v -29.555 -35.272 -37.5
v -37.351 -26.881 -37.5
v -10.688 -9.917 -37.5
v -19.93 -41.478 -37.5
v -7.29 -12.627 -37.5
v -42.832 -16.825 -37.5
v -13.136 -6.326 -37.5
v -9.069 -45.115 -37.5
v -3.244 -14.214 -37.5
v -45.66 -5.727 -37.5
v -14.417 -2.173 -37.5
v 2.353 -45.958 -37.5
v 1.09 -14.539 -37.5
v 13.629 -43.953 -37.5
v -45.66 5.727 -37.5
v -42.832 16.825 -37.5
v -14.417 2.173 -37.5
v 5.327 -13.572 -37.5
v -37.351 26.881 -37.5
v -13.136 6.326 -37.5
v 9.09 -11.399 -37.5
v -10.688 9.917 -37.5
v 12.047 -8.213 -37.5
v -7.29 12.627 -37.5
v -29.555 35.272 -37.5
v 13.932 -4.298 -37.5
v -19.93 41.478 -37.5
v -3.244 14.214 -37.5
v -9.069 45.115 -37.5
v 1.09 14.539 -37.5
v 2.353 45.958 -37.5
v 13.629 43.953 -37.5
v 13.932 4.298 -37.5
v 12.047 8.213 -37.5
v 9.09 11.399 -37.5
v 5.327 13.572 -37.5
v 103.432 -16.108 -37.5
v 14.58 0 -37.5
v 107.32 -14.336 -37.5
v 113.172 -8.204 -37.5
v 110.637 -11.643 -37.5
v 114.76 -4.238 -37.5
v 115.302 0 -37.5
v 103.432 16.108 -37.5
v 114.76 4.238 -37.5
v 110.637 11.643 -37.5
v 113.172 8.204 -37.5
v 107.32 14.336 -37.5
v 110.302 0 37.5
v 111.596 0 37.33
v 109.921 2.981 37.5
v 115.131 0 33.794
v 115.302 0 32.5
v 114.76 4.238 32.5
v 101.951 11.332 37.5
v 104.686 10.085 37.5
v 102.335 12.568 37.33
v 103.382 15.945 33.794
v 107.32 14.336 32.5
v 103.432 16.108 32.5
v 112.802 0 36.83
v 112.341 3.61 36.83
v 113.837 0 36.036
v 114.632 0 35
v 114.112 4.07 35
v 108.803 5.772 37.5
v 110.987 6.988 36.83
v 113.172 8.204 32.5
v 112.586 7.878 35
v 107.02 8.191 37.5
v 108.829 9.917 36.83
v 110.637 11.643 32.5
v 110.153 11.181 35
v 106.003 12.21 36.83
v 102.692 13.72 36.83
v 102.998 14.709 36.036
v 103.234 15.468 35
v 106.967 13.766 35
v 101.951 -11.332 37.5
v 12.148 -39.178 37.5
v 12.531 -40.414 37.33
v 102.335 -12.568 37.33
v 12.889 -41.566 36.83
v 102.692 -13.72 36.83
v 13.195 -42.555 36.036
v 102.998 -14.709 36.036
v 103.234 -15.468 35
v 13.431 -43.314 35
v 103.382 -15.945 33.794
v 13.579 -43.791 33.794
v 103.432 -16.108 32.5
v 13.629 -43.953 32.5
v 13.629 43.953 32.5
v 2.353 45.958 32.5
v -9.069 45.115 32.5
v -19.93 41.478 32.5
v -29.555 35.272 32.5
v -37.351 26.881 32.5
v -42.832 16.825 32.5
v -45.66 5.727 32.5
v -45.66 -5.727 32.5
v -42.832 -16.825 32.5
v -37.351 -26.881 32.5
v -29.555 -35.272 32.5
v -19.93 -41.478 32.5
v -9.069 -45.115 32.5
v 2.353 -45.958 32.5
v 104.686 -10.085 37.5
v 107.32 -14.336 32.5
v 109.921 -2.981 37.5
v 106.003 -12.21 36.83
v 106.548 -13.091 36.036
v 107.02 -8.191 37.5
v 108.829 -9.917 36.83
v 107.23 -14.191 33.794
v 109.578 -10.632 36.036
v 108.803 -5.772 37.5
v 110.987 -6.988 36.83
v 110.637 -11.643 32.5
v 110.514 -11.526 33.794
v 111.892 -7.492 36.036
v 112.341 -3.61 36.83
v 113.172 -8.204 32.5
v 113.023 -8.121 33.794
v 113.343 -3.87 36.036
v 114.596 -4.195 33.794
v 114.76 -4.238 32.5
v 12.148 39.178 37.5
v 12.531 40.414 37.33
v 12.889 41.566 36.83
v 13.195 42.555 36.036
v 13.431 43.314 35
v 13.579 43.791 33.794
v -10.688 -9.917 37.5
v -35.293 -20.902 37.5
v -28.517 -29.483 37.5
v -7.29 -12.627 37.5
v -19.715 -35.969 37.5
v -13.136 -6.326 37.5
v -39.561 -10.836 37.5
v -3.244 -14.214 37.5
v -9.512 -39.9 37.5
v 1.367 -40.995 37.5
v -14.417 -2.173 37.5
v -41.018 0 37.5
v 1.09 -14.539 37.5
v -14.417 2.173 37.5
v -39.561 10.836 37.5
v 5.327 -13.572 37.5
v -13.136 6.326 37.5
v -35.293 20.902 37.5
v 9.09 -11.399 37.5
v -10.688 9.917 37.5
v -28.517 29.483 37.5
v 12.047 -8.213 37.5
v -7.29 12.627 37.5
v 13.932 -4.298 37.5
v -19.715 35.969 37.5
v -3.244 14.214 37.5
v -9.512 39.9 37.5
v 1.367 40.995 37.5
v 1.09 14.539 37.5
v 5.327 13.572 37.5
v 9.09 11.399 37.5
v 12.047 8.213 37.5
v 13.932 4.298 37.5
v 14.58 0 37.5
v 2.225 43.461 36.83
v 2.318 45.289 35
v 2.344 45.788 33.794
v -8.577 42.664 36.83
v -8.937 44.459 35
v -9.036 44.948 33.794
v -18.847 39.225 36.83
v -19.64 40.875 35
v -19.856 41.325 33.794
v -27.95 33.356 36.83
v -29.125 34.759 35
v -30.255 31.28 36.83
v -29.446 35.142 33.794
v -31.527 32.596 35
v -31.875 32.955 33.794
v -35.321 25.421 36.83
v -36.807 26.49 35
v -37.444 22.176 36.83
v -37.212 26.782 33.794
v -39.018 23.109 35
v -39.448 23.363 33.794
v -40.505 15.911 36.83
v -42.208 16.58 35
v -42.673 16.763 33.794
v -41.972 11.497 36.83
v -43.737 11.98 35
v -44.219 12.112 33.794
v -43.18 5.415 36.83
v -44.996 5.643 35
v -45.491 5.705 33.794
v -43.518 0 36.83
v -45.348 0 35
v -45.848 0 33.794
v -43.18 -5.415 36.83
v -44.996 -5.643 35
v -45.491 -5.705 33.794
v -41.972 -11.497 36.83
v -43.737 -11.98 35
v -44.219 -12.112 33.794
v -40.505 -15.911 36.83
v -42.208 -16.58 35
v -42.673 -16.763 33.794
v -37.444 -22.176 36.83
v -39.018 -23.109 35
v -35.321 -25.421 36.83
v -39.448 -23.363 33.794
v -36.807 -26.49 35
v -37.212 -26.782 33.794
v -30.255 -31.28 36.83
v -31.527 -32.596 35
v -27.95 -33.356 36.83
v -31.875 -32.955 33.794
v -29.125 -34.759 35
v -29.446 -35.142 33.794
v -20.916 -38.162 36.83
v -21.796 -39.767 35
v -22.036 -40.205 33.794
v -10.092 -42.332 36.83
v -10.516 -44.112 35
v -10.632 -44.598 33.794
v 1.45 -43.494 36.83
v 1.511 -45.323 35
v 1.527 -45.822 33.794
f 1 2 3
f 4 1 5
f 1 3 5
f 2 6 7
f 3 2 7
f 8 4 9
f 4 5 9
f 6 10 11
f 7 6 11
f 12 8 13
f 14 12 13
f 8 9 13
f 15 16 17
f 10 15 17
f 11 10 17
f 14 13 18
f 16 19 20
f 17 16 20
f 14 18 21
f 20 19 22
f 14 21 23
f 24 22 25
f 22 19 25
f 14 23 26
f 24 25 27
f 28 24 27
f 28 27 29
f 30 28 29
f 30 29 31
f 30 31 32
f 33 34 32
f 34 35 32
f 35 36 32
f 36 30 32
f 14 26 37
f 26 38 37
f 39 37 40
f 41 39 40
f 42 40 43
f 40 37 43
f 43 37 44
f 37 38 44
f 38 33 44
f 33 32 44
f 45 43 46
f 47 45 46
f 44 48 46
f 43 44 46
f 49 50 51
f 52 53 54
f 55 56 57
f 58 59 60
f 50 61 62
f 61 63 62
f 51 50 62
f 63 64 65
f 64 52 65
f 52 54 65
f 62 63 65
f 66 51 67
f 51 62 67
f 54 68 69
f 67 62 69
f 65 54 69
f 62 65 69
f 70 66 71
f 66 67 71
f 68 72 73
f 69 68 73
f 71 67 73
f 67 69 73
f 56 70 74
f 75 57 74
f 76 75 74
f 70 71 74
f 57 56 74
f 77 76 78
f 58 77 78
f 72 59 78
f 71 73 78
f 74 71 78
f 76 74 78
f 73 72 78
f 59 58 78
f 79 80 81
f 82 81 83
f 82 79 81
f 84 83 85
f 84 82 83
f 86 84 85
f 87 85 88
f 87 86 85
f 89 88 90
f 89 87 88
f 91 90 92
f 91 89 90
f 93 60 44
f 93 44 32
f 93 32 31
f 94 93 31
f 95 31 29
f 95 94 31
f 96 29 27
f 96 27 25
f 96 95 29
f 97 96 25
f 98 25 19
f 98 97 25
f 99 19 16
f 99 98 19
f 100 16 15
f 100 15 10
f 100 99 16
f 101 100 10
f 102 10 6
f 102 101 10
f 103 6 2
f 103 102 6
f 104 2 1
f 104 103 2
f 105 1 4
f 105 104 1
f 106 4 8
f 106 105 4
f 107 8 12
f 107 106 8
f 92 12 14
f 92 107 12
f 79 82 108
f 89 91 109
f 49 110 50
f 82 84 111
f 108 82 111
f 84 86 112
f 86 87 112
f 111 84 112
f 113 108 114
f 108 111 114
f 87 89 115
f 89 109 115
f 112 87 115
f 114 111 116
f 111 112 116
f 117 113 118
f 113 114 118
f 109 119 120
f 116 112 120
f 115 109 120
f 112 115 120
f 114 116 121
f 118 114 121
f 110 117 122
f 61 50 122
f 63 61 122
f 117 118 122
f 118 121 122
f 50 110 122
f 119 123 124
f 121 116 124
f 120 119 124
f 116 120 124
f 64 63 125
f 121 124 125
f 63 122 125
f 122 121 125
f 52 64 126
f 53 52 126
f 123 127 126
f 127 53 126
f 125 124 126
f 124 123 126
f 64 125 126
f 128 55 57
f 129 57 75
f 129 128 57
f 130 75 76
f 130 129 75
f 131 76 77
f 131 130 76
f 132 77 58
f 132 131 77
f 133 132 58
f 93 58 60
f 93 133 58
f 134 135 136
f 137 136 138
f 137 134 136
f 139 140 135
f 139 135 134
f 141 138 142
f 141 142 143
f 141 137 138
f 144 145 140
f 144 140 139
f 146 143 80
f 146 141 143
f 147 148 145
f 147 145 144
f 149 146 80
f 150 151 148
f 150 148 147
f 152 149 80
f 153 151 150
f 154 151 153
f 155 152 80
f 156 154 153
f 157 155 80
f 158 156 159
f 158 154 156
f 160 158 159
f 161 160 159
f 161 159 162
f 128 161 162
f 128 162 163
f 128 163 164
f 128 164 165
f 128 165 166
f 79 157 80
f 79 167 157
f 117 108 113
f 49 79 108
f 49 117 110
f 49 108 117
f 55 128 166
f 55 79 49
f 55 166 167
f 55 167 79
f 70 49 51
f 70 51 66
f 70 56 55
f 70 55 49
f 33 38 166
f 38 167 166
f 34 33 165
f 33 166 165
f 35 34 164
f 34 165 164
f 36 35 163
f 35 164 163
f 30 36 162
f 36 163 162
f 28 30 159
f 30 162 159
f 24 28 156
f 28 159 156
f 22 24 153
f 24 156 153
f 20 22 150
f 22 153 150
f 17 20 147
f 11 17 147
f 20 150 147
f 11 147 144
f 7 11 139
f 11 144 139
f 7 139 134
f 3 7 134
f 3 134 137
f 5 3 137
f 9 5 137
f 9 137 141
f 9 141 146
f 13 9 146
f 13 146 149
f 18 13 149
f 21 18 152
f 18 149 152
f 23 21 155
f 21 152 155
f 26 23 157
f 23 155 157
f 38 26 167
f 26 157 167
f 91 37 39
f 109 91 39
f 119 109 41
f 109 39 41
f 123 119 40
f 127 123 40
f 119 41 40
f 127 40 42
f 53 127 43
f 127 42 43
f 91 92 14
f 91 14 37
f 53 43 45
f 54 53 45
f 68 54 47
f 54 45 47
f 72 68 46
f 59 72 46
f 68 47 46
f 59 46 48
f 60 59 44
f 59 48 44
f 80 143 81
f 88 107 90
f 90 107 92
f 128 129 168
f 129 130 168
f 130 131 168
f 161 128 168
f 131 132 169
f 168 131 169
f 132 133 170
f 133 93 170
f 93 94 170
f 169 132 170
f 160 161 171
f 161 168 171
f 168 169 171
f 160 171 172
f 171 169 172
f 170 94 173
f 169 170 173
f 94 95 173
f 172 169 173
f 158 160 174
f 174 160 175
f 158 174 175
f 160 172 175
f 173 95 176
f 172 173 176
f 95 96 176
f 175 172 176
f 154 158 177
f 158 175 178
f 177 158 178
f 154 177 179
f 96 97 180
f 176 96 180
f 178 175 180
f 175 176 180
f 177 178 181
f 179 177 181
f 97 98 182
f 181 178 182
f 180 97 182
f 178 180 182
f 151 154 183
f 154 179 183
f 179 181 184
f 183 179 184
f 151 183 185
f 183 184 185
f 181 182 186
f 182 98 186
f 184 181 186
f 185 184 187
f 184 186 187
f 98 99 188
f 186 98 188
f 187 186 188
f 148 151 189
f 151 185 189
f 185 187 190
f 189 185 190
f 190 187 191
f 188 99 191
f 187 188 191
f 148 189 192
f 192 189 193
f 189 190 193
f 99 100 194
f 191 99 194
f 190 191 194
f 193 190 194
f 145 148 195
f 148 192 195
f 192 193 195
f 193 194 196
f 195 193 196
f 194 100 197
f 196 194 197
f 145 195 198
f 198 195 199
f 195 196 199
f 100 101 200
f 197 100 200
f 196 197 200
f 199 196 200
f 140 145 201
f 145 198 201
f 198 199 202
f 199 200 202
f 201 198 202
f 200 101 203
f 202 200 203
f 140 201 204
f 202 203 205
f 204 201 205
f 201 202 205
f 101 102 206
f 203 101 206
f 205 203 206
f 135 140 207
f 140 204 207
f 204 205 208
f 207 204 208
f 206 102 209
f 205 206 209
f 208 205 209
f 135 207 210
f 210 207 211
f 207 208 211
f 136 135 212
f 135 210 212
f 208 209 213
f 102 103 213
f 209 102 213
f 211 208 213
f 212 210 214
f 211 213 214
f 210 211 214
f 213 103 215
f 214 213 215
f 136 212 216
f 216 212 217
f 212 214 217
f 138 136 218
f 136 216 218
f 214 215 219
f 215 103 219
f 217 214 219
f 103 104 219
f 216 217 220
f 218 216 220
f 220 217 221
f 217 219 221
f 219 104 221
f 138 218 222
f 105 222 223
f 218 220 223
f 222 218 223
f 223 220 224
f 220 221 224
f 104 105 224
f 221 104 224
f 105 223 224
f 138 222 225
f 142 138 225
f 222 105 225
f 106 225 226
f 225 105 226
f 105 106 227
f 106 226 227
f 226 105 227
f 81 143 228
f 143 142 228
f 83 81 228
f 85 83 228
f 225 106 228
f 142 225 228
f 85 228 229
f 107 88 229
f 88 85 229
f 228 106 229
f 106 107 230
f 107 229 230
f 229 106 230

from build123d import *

# Parameters (mm, degrees)
F1_DEPTH      = 37.5
F2_R          = 14.5799335076
F3_DEPTH      = 37.501
F3_DEPTH_BACK = 37.501
F4_R          = 5


with BuildPart() as f1:
    # F0 (on Top) → F1 (new body, symmetric)
    with BuildSketch(Plane.XY):
        with BuildLine():
            ThreePointArc((13.6289698518, -43.9534703049), (37.0461490082, -27.2990698509), (46.0180005113, 0))
            ThreePointArc((46.0180005113, 0), (37.0461490082, 27.2990698509), (13.6289698518, 43.9534703049))
            ThreePointArc((13.6289698518, 43.9534703049), (-46.0180005113, 0), (13.6289698518, -43.9534703049))
        make_face()
        with BuildLine():
            ThreePointArc((13.6289698518, 43.9534703049), (37.0461490082, 27.2990698509), (46.0180005113, 0))
            ThreePointArc((46.0180005113, 0), (37.0461490082, -27.2990698509), (13.6289698518, -43.9534703049))
            Line((13.6289698518, -43.9534703049), (103.4320995684, -16.1075655557))
            ThreePointArc((103.4320995684, -16.1075655557), (81.5733594357, 0), (103.4320995684, 16.1075655557))
            Line((103.4320995684, 16.1075655557), (13.6289698518, 43.9534703049))
        make_face()
        with BuildLine():
            ThreePointArc((115.3016614259, 0), (112.0137598054, 10.0042511816), (103.4320995684, 16.1075655557))
            ThreePointArc((103.4320995684, 16.1075655557), (81.5733594357, 0), (103.4320995684, -16.1075655557))
            ThreePointArc((103.4320995684, -16.1075655557), (112.0137598054, -10.0042511816), (115.3016614259, 0))
        make_face()
    extrude(amount=F1_DEPTH, both=True)

    # F2 (on Top) → F3 (cut, two sides)
    with BuildSketch(Plane.XY) as f3_sk:
        Circle(F2_R)
    extrude(amount=-F3_DEPTH, mode=Mode.SUBTRACT)
    extrude(f3_sk.sketch, amount=F3_DEPTH_BACK, mode=Mode.SUBTRACT)

    # F4
    f4_edges = [f1.edges().sort_by_distance(p)[0] for p in [
        (58.530535, -30.030518, 37.5),
    ]]
    fillet(f4_edges, radius=F4_R)


solid = f1.part
